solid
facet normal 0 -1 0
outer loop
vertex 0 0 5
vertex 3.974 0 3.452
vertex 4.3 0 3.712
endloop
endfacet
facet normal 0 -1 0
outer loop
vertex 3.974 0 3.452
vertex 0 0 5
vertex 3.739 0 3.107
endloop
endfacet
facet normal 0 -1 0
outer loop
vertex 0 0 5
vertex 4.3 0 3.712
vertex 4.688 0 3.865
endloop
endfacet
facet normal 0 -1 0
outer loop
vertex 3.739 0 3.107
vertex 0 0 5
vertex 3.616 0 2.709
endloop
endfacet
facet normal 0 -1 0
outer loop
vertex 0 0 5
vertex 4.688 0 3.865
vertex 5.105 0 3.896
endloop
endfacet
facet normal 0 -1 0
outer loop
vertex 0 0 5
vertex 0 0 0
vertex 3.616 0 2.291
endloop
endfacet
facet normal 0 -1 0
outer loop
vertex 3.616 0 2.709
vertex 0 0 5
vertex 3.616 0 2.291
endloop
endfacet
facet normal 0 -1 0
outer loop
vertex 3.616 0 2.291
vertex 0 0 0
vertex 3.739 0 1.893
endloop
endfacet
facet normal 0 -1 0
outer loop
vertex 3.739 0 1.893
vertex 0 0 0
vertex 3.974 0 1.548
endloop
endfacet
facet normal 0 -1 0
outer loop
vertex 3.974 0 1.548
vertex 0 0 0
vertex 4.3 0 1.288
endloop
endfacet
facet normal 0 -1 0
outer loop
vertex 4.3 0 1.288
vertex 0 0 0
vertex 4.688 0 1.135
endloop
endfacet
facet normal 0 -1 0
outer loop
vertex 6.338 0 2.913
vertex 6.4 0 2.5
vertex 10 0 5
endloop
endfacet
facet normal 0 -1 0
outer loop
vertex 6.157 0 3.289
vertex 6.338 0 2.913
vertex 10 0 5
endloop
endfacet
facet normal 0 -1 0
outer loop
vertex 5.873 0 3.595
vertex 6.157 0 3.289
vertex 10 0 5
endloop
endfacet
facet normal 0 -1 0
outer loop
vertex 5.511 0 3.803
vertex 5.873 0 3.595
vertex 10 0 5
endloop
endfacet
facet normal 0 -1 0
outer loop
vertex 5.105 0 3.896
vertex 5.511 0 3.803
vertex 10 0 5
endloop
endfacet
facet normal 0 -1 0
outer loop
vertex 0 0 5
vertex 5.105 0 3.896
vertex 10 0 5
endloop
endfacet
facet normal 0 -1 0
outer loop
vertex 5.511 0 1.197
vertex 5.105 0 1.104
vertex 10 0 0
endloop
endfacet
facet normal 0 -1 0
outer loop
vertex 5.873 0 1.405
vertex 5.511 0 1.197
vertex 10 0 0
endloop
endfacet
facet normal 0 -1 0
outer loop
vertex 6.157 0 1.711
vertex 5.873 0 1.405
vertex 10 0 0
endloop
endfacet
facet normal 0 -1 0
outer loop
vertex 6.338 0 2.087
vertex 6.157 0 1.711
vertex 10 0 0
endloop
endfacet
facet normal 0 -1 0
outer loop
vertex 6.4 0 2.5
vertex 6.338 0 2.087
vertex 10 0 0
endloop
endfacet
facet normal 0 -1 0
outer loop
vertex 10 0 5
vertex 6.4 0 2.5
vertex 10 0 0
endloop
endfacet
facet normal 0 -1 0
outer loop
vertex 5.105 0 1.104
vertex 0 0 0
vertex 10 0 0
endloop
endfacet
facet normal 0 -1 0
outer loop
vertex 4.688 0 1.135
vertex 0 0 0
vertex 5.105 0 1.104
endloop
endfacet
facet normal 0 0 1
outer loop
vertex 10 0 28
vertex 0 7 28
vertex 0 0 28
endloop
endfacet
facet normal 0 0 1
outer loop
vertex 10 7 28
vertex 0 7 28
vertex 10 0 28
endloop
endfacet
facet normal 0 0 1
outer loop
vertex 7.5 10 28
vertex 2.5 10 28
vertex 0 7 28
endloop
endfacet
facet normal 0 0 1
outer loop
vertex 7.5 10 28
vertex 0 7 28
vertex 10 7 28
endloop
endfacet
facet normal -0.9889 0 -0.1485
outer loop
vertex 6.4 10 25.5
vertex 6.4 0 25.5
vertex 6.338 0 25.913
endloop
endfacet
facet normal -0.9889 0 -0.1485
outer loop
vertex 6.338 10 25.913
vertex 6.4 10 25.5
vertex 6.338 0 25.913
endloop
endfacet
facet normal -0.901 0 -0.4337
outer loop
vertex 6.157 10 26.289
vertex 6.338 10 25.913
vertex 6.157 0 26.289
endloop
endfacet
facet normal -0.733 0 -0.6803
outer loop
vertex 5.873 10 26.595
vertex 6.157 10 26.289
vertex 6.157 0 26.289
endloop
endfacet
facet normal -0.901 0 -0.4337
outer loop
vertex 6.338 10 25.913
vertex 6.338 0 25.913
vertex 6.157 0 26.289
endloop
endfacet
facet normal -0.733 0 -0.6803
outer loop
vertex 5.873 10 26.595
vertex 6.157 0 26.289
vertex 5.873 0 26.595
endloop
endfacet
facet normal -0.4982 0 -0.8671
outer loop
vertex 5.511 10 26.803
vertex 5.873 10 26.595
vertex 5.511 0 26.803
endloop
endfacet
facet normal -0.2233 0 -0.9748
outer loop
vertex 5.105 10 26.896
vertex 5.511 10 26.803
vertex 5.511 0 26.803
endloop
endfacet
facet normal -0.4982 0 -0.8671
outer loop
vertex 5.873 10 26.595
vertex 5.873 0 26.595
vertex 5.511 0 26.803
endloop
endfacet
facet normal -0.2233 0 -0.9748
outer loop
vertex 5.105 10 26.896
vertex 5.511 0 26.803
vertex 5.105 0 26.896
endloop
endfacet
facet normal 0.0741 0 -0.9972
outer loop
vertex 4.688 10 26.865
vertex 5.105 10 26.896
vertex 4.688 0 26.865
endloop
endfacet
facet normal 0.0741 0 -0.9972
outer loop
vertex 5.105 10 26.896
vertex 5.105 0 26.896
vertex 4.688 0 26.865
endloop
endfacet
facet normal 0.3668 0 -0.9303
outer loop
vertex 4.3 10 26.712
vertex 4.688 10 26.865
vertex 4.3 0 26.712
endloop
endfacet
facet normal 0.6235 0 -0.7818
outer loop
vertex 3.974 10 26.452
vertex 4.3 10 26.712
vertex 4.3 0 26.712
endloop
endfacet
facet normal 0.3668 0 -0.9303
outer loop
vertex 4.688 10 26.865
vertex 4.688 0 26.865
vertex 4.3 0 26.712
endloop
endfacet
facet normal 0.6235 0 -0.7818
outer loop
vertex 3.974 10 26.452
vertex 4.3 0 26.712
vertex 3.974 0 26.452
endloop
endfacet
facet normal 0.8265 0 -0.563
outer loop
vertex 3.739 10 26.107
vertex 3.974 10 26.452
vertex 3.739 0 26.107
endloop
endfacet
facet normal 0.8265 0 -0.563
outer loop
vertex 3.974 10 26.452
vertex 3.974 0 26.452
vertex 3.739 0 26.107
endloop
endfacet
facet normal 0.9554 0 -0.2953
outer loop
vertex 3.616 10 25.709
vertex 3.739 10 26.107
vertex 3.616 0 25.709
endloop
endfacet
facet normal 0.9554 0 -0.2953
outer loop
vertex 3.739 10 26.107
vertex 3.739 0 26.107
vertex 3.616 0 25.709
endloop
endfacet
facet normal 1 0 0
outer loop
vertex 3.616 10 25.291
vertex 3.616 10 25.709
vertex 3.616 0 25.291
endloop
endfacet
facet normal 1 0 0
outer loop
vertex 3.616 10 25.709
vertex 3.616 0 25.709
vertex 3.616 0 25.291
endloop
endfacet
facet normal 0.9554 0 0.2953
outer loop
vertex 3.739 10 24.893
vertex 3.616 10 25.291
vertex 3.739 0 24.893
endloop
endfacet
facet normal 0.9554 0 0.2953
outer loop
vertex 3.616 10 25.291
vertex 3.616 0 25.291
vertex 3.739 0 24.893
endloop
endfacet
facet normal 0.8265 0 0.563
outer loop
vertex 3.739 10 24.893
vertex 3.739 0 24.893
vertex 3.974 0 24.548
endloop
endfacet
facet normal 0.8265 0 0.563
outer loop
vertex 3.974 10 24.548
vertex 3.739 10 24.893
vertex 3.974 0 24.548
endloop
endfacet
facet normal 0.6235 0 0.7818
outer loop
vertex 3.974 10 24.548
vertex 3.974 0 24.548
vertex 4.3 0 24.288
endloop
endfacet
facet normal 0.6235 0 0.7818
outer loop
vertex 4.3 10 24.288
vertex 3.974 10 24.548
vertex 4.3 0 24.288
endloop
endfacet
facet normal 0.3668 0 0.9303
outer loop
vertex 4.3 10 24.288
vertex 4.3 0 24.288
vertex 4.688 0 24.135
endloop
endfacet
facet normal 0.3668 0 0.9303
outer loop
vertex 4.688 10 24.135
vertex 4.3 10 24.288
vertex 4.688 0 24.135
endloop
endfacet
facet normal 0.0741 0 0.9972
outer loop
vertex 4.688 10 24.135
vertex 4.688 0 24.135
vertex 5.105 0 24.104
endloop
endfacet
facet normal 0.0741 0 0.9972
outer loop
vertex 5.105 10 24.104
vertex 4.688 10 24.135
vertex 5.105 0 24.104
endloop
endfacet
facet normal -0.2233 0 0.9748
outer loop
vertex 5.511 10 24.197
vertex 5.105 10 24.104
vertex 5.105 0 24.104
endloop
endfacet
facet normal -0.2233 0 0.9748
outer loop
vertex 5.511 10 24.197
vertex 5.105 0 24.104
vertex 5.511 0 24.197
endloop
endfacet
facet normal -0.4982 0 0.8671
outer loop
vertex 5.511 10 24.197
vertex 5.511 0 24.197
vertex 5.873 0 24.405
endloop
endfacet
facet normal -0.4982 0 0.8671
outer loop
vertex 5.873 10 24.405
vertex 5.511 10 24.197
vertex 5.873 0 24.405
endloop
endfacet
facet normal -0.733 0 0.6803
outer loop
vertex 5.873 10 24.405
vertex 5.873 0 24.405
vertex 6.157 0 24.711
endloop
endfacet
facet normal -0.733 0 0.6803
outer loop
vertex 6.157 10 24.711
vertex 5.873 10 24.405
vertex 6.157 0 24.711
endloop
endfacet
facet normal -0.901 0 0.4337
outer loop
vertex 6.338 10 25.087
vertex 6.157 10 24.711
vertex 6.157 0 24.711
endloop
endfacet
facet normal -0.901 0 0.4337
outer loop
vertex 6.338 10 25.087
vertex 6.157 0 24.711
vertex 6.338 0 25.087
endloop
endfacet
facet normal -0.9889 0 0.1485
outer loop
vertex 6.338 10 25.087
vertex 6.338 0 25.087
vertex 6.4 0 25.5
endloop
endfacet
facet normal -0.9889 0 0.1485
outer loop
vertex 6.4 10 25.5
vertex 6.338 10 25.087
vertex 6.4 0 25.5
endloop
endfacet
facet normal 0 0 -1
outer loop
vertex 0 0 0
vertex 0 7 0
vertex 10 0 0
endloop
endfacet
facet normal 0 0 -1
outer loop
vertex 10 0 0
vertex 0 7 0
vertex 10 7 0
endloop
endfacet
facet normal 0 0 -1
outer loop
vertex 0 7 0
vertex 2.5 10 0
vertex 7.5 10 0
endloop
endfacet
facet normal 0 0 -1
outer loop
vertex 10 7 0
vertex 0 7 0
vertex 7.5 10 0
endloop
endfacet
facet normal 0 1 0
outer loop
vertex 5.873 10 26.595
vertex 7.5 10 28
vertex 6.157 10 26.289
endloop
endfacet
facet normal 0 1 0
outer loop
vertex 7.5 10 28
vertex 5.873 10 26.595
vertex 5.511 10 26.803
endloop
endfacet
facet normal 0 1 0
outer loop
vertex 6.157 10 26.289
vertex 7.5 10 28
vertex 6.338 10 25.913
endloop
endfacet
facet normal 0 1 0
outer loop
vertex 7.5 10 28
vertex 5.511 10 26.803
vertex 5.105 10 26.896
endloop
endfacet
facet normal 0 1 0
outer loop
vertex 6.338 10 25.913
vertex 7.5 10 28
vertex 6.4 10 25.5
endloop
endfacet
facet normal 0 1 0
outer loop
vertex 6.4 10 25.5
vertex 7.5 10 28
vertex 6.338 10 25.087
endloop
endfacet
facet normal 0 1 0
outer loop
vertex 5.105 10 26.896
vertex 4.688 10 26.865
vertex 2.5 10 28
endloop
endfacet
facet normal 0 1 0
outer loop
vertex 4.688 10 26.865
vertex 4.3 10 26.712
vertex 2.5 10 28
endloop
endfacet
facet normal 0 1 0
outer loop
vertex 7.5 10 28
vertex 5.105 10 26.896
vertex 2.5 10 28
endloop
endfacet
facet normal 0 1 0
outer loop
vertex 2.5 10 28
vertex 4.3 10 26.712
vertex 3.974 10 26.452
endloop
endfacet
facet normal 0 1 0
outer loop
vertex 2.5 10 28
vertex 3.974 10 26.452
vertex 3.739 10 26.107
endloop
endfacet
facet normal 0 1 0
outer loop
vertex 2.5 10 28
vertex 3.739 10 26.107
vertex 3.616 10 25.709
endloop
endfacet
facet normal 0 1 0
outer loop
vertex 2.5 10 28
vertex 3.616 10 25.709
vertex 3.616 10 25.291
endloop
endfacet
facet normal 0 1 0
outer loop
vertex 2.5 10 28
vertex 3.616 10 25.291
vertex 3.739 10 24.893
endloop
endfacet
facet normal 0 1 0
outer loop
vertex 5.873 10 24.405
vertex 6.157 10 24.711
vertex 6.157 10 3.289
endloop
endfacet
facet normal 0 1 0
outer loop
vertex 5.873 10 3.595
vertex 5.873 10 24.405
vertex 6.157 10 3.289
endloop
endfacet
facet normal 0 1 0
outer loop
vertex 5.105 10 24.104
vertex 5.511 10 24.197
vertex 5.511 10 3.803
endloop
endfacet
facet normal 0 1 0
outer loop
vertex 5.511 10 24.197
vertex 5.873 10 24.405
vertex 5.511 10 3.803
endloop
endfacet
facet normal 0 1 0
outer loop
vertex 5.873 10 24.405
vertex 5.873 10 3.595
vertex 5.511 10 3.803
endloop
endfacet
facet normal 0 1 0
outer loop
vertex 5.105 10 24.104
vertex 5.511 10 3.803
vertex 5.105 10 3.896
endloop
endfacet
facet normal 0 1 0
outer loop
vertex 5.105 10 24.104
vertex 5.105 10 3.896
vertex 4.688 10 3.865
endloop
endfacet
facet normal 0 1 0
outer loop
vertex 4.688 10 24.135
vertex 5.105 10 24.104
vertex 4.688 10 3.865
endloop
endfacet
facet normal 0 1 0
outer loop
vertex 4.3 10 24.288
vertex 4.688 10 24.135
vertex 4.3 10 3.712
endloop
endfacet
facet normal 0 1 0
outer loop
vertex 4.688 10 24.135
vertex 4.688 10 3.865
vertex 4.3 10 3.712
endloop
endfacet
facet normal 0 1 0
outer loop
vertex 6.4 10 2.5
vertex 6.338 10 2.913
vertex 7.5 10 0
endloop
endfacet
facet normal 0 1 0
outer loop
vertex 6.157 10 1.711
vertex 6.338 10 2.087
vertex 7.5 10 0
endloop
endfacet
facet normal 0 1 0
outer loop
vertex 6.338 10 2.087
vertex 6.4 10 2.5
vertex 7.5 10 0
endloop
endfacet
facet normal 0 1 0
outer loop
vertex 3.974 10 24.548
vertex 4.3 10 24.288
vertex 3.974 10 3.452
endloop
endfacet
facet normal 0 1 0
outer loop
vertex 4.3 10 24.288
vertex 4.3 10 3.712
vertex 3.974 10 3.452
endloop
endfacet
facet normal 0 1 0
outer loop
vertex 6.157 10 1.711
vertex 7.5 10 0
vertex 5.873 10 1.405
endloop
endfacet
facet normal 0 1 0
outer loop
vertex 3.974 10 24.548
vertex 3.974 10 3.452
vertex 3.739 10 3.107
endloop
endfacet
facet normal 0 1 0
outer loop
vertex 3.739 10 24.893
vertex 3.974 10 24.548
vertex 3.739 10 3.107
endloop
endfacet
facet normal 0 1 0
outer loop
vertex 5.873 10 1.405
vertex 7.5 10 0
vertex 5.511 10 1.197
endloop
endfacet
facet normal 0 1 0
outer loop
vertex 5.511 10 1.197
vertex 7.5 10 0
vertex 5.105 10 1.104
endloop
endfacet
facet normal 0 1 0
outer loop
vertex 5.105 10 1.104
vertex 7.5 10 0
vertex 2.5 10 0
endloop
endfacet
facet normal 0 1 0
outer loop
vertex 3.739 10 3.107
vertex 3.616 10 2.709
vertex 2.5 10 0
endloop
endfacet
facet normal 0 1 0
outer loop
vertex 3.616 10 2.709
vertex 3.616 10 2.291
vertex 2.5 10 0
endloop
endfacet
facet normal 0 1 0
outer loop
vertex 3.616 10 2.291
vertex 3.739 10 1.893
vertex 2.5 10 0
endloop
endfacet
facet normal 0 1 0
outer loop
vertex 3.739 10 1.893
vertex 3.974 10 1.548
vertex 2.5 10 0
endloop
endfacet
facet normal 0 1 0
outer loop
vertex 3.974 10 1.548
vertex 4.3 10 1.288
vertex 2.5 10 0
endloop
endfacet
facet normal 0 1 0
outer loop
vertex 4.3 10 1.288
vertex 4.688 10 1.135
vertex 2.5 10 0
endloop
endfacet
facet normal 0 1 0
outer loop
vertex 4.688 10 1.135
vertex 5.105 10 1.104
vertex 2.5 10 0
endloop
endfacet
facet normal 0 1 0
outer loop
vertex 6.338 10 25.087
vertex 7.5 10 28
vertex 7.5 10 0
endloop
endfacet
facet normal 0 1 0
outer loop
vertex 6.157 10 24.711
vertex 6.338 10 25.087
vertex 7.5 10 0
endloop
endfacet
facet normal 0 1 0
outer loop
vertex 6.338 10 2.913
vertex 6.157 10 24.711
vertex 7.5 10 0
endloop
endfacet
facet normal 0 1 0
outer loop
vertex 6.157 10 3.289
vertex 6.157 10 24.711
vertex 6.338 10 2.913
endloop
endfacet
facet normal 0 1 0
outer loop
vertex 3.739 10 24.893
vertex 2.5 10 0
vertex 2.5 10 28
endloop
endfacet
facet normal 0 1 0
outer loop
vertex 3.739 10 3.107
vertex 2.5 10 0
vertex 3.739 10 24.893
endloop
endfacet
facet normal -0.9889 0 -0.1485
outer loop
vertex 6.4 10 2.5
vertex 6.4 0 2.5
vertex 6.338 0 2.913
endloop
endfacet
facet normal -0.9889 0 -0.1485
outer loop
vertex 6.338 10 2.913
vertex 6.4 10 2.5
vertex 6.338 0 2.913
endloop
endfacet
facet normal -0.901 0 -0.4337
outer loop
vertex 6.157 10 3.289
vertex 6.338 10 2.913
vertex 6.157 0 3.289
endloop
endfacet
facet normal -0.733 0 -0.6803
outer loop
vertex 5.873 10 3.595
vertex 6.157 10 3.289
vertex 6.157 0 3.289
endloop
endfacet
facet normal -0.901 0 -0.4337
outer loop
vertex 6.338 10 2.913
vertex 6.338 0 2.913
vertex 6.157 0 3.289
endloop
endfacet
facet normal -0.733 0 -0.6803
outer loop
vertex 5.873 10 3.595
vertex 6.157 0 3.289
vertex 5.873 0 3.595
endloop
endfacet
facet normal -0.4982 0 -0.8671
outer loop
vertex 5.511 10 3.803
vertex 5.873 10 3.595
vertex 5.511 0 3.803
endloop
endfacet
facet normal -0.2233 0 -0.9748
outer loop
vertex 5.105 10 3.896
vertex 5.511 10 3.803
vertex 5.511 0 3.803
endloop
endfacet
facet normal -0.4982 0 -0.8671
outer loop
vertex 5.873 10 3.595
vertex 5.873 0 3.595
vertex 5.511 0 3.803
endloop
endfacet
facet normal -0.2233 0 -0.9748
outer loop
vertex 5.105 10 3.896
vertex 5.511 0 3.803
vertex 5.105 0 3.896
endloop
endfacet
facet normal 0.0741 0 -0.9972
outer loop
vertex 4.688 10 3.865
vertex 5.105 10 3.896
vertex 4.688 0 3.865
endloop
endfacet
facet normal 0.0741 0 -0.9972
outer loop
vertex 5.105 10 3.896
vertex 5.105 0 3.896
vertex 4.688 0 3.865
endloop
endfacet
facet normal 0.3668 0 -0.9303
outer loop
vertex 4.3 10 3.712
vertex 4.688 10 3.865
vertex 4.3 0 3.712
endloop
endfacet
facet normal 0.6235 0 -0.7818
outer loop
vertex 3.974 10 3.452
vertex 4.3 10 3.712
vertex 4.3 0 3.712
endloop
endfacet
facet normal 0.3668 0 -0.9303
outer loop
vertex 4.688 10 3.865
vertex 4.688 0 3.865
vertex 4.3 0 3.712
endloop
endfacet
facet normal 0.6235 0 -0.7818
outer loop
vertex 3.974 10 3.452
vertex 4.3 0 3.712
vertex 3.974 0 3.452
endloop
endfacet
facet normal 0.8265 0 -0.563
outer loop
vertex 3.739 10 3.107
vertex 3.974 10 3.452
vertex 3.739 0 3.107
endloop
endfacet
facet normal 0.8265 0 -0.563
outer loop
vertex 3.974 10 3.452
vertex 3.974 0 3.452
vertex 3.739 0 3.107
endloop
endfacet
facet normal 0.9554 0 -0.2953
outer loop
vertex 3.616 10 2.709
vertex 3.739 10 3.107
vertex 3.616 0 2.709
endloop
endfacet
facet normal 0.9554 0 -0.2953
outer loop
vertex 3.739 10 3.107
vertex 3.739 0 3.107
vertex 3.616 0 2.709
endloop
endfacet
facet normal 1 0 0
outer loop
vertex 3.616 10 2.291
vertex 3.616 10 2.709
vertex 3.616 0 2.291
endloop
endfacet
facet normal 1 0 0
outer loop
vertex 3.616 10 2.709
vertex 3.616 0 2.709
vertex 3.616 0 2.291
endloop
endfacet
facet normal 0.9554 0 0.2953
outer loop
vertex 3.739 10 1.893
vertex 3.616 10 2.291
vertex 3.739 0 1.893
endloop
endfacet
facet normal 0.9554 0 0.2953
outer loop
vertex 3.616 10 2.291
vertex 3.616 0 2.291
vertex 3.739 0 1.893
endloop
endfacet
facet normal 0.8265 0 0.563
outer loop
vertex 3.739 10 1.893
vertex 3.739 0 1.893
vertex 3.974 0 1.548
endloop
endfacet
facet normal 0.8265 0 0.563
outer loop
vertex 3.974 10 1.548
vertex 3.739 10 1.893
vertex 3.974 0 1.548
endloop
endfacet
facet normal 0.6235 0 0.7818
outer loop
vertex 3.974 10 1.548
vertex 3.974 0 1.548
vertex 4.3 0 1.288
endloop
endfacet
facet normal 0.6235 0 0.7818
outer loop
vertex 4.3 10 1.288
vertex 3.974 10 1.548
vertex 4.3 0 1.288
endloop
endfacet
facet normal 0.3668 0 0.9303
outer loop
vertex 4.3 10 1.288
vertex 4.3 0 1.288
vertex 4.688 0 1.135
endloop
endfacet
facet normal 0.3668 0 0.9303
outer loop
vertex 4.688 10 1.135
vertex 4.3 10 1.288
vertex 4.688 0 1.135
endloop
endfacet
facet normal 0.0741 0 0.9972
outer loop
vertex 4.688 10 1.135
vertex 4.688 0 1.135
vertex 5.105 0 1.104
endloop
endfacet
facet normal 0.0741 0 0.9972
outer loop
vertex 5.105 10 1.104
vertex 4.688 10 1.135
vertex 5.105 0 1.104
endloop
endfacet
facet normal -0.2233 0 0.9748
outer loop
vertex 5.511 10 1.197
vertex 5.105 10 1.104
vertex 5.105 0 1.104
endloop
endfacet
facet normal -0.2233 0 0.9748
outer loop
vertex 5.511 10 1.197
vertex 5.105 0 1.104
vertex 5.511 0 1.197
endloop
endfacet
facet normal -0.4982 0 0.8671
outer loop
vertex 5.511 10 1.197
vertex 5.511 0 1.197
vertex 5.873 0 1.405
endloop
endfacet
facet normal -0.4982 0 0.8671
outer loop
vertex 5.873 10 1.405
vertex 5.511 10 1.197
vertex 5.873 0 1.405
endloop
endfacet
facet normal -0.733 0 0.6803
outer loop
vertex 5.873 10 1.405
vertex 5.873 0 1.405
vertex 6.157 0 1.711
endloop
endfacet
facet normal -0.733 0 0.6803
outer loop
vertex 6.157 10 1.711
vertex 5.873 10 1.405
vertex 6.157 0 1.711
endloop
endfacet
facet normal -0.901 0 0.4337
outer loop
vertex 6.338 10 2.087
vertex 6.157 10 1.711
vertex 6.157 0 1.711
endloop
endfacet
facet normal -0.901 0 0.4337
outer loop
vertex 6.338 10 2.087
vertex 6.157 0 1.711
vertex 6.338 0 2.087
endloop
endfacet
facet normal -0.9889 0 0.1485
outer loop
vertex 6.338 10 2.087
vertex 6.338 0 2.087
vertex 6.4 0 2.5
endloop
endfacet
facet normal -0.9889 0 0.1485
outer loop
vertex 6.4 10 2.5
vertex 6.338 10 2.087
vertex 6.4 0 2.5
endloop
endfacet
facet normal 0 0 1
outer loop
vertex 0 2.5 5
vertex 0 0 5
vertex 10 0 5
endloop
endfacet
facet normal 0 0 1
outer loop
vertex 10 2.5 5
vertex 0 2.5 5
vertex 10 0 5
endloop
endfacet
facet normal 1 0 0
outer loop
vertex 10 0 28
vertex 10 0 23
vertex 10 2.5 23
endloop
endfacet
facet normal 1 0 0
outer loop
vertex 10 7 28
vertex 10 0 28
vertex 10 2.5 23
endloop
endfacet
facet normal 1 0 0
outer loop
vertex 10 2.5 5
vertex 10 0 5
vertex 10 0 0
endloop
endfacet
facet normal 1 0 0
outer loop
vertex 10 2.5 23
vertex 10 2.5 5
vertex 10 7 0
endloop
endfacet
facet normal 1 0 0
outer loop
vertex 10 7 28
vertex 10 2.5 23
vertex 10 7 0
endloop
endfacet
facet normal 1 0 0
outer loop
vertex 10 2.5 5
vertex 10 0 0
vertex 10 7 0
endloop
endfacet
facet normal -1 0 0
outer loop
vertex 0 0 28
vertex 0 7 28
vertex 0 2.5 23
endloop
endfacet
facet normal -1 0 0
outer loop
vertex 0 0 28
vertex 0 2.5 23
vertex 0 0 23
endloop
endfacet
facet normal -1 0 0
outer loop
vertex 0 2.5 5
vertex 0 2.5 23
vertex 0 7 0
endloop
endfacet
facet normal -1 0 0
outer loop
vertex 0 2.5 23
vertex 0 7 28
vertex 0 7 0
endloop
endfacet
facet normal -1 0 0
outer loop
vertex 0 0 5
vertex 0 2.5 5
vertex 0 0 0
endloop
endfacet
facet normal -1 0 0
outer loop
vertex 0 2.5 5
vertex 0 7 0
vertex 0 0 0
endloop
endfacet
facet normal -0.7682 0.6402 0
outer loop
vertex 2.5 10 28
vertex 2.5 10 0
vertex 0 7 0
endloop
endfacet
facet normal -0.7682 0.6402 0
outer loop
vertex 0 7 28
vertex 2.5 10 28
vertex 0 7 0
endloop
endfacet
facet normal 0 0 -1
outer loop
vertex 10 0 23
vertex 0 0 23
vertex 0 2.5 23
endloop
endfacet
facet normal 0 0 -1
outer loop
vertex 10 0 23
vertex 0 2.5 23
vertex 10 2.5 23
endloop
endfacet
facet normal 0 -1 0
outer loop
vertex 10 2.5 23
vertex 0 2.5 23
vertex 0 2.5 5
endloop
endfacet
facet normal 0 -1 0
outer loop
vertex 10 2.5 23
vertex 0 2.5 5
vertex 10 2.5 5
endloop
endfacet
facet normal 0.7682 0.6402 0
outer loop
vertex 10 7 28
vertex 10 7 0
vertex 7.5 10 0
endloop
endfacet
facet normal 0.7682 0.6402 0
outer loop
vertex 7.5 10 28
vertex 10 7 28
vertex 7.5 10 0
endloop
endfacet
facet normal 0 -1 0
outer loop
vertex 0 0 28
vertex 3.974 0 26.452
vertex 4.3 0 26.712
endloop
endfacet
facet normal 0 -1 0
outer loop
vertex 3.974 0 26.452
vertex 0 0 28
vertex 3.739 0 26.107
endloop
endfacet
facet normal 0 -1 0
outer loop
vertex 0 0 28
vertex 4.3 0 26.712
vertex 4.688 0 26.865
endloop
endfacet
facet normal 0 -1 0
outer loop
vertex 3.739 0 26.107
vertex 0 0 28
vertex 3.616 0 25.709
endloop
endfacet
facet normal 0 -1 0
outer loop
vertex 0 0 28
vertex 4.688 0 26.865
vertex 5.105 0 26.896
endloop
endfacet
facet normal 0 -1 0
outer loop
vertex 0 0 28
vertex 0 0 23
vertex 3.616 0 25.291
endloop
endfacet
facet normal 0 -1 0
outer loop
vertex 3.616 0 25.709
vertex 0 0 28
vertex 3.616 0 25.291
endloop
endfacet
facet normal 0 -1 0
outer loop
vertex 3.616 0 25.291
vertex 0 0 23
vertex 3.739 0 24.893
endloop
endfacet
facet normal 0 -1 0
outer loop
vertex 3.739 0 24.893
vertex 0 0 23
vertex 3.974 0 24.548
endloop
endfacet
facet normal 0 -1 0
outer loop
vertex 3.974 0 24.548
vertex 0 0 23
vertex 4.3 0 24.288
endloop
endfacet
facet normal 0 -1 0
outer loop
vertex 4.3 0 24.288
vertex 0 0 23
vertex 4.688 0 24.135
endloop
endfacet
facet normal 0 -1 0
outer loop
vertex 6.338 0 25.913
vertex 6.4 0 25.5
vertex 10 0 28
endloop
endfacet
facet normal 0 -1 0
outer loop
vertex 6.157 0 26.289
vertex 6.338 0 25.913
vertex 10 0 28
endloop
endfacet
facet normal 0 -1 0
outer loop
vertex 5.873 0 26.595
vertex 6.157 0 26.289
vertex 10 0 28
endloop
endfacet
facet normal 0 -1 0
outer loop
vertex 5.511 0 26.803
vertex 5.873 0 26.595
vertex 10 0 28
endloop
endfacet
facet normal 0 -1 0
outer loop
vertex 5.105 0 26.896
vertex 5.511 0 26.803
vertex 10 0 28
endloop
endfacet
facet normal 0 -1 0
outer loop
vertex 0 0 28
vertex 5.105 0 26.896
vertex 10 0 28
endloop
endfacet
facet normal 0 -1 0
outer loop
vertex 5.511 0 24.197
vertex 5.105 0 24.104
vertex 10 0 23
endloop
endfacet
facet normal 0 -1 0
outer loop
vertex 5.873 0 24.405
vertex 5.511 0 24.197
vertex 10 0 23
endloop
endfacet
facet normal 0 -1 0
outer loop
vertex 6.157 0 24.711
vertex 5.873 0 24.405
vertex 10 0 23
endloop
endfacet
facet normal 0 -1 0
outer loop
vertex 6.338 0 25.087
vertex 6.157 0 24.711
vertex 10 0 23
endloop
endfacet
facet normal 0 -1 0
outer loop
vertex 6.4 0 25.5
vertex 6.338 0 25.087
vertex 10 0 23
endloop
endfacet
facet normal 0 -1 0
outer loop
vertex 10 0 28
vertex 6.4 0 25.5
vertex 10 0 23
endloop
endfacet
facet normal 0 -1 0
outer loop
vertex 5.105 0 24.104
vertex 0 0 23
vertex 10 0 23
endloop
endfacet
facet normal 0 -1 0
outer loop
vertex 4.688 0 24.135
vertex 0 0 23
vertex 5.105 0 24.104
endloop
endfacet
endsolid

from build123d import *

# Parameters (mm, degrees)
F1_DEPTH = 28
F2_W     = 10
F2_H     = 18
F3_DEPTH = 2.5
F2_R     = 1.4
F4_DEPTH = 25


with BuildPart() as f1:
    # F0 (on Top) → F1 (new body)
    with BuildSketch(Plane.XY):
        Polygon((0, 7), (0, 0), (10, 0), (10, 7), (7.5, 10), (2.5, 10), align=None)
    extrude(amount=F1_DEPTH)

    # F2 (on face) → F3 (cut)
    with BuildSketch(Plane.XZ):
        with Locations((5, 14)):
            Rectangle(F2_W, F2_H)
    extrude(amount=-F3_DEPTH, mode=Mode.SUBTRACT)

    # F2 (on face) → F4 (cut)
    with BuildSketch(Plane.XZ):
        with Locations((5, 25.5)):
            Circle(F2_R)
        with Locations((5, 2.5)):
            Circle(F2_R)
    extrude(amount=-F4_DEPTH, mode=Mode.SUBTRACT)


solid = f1.part
